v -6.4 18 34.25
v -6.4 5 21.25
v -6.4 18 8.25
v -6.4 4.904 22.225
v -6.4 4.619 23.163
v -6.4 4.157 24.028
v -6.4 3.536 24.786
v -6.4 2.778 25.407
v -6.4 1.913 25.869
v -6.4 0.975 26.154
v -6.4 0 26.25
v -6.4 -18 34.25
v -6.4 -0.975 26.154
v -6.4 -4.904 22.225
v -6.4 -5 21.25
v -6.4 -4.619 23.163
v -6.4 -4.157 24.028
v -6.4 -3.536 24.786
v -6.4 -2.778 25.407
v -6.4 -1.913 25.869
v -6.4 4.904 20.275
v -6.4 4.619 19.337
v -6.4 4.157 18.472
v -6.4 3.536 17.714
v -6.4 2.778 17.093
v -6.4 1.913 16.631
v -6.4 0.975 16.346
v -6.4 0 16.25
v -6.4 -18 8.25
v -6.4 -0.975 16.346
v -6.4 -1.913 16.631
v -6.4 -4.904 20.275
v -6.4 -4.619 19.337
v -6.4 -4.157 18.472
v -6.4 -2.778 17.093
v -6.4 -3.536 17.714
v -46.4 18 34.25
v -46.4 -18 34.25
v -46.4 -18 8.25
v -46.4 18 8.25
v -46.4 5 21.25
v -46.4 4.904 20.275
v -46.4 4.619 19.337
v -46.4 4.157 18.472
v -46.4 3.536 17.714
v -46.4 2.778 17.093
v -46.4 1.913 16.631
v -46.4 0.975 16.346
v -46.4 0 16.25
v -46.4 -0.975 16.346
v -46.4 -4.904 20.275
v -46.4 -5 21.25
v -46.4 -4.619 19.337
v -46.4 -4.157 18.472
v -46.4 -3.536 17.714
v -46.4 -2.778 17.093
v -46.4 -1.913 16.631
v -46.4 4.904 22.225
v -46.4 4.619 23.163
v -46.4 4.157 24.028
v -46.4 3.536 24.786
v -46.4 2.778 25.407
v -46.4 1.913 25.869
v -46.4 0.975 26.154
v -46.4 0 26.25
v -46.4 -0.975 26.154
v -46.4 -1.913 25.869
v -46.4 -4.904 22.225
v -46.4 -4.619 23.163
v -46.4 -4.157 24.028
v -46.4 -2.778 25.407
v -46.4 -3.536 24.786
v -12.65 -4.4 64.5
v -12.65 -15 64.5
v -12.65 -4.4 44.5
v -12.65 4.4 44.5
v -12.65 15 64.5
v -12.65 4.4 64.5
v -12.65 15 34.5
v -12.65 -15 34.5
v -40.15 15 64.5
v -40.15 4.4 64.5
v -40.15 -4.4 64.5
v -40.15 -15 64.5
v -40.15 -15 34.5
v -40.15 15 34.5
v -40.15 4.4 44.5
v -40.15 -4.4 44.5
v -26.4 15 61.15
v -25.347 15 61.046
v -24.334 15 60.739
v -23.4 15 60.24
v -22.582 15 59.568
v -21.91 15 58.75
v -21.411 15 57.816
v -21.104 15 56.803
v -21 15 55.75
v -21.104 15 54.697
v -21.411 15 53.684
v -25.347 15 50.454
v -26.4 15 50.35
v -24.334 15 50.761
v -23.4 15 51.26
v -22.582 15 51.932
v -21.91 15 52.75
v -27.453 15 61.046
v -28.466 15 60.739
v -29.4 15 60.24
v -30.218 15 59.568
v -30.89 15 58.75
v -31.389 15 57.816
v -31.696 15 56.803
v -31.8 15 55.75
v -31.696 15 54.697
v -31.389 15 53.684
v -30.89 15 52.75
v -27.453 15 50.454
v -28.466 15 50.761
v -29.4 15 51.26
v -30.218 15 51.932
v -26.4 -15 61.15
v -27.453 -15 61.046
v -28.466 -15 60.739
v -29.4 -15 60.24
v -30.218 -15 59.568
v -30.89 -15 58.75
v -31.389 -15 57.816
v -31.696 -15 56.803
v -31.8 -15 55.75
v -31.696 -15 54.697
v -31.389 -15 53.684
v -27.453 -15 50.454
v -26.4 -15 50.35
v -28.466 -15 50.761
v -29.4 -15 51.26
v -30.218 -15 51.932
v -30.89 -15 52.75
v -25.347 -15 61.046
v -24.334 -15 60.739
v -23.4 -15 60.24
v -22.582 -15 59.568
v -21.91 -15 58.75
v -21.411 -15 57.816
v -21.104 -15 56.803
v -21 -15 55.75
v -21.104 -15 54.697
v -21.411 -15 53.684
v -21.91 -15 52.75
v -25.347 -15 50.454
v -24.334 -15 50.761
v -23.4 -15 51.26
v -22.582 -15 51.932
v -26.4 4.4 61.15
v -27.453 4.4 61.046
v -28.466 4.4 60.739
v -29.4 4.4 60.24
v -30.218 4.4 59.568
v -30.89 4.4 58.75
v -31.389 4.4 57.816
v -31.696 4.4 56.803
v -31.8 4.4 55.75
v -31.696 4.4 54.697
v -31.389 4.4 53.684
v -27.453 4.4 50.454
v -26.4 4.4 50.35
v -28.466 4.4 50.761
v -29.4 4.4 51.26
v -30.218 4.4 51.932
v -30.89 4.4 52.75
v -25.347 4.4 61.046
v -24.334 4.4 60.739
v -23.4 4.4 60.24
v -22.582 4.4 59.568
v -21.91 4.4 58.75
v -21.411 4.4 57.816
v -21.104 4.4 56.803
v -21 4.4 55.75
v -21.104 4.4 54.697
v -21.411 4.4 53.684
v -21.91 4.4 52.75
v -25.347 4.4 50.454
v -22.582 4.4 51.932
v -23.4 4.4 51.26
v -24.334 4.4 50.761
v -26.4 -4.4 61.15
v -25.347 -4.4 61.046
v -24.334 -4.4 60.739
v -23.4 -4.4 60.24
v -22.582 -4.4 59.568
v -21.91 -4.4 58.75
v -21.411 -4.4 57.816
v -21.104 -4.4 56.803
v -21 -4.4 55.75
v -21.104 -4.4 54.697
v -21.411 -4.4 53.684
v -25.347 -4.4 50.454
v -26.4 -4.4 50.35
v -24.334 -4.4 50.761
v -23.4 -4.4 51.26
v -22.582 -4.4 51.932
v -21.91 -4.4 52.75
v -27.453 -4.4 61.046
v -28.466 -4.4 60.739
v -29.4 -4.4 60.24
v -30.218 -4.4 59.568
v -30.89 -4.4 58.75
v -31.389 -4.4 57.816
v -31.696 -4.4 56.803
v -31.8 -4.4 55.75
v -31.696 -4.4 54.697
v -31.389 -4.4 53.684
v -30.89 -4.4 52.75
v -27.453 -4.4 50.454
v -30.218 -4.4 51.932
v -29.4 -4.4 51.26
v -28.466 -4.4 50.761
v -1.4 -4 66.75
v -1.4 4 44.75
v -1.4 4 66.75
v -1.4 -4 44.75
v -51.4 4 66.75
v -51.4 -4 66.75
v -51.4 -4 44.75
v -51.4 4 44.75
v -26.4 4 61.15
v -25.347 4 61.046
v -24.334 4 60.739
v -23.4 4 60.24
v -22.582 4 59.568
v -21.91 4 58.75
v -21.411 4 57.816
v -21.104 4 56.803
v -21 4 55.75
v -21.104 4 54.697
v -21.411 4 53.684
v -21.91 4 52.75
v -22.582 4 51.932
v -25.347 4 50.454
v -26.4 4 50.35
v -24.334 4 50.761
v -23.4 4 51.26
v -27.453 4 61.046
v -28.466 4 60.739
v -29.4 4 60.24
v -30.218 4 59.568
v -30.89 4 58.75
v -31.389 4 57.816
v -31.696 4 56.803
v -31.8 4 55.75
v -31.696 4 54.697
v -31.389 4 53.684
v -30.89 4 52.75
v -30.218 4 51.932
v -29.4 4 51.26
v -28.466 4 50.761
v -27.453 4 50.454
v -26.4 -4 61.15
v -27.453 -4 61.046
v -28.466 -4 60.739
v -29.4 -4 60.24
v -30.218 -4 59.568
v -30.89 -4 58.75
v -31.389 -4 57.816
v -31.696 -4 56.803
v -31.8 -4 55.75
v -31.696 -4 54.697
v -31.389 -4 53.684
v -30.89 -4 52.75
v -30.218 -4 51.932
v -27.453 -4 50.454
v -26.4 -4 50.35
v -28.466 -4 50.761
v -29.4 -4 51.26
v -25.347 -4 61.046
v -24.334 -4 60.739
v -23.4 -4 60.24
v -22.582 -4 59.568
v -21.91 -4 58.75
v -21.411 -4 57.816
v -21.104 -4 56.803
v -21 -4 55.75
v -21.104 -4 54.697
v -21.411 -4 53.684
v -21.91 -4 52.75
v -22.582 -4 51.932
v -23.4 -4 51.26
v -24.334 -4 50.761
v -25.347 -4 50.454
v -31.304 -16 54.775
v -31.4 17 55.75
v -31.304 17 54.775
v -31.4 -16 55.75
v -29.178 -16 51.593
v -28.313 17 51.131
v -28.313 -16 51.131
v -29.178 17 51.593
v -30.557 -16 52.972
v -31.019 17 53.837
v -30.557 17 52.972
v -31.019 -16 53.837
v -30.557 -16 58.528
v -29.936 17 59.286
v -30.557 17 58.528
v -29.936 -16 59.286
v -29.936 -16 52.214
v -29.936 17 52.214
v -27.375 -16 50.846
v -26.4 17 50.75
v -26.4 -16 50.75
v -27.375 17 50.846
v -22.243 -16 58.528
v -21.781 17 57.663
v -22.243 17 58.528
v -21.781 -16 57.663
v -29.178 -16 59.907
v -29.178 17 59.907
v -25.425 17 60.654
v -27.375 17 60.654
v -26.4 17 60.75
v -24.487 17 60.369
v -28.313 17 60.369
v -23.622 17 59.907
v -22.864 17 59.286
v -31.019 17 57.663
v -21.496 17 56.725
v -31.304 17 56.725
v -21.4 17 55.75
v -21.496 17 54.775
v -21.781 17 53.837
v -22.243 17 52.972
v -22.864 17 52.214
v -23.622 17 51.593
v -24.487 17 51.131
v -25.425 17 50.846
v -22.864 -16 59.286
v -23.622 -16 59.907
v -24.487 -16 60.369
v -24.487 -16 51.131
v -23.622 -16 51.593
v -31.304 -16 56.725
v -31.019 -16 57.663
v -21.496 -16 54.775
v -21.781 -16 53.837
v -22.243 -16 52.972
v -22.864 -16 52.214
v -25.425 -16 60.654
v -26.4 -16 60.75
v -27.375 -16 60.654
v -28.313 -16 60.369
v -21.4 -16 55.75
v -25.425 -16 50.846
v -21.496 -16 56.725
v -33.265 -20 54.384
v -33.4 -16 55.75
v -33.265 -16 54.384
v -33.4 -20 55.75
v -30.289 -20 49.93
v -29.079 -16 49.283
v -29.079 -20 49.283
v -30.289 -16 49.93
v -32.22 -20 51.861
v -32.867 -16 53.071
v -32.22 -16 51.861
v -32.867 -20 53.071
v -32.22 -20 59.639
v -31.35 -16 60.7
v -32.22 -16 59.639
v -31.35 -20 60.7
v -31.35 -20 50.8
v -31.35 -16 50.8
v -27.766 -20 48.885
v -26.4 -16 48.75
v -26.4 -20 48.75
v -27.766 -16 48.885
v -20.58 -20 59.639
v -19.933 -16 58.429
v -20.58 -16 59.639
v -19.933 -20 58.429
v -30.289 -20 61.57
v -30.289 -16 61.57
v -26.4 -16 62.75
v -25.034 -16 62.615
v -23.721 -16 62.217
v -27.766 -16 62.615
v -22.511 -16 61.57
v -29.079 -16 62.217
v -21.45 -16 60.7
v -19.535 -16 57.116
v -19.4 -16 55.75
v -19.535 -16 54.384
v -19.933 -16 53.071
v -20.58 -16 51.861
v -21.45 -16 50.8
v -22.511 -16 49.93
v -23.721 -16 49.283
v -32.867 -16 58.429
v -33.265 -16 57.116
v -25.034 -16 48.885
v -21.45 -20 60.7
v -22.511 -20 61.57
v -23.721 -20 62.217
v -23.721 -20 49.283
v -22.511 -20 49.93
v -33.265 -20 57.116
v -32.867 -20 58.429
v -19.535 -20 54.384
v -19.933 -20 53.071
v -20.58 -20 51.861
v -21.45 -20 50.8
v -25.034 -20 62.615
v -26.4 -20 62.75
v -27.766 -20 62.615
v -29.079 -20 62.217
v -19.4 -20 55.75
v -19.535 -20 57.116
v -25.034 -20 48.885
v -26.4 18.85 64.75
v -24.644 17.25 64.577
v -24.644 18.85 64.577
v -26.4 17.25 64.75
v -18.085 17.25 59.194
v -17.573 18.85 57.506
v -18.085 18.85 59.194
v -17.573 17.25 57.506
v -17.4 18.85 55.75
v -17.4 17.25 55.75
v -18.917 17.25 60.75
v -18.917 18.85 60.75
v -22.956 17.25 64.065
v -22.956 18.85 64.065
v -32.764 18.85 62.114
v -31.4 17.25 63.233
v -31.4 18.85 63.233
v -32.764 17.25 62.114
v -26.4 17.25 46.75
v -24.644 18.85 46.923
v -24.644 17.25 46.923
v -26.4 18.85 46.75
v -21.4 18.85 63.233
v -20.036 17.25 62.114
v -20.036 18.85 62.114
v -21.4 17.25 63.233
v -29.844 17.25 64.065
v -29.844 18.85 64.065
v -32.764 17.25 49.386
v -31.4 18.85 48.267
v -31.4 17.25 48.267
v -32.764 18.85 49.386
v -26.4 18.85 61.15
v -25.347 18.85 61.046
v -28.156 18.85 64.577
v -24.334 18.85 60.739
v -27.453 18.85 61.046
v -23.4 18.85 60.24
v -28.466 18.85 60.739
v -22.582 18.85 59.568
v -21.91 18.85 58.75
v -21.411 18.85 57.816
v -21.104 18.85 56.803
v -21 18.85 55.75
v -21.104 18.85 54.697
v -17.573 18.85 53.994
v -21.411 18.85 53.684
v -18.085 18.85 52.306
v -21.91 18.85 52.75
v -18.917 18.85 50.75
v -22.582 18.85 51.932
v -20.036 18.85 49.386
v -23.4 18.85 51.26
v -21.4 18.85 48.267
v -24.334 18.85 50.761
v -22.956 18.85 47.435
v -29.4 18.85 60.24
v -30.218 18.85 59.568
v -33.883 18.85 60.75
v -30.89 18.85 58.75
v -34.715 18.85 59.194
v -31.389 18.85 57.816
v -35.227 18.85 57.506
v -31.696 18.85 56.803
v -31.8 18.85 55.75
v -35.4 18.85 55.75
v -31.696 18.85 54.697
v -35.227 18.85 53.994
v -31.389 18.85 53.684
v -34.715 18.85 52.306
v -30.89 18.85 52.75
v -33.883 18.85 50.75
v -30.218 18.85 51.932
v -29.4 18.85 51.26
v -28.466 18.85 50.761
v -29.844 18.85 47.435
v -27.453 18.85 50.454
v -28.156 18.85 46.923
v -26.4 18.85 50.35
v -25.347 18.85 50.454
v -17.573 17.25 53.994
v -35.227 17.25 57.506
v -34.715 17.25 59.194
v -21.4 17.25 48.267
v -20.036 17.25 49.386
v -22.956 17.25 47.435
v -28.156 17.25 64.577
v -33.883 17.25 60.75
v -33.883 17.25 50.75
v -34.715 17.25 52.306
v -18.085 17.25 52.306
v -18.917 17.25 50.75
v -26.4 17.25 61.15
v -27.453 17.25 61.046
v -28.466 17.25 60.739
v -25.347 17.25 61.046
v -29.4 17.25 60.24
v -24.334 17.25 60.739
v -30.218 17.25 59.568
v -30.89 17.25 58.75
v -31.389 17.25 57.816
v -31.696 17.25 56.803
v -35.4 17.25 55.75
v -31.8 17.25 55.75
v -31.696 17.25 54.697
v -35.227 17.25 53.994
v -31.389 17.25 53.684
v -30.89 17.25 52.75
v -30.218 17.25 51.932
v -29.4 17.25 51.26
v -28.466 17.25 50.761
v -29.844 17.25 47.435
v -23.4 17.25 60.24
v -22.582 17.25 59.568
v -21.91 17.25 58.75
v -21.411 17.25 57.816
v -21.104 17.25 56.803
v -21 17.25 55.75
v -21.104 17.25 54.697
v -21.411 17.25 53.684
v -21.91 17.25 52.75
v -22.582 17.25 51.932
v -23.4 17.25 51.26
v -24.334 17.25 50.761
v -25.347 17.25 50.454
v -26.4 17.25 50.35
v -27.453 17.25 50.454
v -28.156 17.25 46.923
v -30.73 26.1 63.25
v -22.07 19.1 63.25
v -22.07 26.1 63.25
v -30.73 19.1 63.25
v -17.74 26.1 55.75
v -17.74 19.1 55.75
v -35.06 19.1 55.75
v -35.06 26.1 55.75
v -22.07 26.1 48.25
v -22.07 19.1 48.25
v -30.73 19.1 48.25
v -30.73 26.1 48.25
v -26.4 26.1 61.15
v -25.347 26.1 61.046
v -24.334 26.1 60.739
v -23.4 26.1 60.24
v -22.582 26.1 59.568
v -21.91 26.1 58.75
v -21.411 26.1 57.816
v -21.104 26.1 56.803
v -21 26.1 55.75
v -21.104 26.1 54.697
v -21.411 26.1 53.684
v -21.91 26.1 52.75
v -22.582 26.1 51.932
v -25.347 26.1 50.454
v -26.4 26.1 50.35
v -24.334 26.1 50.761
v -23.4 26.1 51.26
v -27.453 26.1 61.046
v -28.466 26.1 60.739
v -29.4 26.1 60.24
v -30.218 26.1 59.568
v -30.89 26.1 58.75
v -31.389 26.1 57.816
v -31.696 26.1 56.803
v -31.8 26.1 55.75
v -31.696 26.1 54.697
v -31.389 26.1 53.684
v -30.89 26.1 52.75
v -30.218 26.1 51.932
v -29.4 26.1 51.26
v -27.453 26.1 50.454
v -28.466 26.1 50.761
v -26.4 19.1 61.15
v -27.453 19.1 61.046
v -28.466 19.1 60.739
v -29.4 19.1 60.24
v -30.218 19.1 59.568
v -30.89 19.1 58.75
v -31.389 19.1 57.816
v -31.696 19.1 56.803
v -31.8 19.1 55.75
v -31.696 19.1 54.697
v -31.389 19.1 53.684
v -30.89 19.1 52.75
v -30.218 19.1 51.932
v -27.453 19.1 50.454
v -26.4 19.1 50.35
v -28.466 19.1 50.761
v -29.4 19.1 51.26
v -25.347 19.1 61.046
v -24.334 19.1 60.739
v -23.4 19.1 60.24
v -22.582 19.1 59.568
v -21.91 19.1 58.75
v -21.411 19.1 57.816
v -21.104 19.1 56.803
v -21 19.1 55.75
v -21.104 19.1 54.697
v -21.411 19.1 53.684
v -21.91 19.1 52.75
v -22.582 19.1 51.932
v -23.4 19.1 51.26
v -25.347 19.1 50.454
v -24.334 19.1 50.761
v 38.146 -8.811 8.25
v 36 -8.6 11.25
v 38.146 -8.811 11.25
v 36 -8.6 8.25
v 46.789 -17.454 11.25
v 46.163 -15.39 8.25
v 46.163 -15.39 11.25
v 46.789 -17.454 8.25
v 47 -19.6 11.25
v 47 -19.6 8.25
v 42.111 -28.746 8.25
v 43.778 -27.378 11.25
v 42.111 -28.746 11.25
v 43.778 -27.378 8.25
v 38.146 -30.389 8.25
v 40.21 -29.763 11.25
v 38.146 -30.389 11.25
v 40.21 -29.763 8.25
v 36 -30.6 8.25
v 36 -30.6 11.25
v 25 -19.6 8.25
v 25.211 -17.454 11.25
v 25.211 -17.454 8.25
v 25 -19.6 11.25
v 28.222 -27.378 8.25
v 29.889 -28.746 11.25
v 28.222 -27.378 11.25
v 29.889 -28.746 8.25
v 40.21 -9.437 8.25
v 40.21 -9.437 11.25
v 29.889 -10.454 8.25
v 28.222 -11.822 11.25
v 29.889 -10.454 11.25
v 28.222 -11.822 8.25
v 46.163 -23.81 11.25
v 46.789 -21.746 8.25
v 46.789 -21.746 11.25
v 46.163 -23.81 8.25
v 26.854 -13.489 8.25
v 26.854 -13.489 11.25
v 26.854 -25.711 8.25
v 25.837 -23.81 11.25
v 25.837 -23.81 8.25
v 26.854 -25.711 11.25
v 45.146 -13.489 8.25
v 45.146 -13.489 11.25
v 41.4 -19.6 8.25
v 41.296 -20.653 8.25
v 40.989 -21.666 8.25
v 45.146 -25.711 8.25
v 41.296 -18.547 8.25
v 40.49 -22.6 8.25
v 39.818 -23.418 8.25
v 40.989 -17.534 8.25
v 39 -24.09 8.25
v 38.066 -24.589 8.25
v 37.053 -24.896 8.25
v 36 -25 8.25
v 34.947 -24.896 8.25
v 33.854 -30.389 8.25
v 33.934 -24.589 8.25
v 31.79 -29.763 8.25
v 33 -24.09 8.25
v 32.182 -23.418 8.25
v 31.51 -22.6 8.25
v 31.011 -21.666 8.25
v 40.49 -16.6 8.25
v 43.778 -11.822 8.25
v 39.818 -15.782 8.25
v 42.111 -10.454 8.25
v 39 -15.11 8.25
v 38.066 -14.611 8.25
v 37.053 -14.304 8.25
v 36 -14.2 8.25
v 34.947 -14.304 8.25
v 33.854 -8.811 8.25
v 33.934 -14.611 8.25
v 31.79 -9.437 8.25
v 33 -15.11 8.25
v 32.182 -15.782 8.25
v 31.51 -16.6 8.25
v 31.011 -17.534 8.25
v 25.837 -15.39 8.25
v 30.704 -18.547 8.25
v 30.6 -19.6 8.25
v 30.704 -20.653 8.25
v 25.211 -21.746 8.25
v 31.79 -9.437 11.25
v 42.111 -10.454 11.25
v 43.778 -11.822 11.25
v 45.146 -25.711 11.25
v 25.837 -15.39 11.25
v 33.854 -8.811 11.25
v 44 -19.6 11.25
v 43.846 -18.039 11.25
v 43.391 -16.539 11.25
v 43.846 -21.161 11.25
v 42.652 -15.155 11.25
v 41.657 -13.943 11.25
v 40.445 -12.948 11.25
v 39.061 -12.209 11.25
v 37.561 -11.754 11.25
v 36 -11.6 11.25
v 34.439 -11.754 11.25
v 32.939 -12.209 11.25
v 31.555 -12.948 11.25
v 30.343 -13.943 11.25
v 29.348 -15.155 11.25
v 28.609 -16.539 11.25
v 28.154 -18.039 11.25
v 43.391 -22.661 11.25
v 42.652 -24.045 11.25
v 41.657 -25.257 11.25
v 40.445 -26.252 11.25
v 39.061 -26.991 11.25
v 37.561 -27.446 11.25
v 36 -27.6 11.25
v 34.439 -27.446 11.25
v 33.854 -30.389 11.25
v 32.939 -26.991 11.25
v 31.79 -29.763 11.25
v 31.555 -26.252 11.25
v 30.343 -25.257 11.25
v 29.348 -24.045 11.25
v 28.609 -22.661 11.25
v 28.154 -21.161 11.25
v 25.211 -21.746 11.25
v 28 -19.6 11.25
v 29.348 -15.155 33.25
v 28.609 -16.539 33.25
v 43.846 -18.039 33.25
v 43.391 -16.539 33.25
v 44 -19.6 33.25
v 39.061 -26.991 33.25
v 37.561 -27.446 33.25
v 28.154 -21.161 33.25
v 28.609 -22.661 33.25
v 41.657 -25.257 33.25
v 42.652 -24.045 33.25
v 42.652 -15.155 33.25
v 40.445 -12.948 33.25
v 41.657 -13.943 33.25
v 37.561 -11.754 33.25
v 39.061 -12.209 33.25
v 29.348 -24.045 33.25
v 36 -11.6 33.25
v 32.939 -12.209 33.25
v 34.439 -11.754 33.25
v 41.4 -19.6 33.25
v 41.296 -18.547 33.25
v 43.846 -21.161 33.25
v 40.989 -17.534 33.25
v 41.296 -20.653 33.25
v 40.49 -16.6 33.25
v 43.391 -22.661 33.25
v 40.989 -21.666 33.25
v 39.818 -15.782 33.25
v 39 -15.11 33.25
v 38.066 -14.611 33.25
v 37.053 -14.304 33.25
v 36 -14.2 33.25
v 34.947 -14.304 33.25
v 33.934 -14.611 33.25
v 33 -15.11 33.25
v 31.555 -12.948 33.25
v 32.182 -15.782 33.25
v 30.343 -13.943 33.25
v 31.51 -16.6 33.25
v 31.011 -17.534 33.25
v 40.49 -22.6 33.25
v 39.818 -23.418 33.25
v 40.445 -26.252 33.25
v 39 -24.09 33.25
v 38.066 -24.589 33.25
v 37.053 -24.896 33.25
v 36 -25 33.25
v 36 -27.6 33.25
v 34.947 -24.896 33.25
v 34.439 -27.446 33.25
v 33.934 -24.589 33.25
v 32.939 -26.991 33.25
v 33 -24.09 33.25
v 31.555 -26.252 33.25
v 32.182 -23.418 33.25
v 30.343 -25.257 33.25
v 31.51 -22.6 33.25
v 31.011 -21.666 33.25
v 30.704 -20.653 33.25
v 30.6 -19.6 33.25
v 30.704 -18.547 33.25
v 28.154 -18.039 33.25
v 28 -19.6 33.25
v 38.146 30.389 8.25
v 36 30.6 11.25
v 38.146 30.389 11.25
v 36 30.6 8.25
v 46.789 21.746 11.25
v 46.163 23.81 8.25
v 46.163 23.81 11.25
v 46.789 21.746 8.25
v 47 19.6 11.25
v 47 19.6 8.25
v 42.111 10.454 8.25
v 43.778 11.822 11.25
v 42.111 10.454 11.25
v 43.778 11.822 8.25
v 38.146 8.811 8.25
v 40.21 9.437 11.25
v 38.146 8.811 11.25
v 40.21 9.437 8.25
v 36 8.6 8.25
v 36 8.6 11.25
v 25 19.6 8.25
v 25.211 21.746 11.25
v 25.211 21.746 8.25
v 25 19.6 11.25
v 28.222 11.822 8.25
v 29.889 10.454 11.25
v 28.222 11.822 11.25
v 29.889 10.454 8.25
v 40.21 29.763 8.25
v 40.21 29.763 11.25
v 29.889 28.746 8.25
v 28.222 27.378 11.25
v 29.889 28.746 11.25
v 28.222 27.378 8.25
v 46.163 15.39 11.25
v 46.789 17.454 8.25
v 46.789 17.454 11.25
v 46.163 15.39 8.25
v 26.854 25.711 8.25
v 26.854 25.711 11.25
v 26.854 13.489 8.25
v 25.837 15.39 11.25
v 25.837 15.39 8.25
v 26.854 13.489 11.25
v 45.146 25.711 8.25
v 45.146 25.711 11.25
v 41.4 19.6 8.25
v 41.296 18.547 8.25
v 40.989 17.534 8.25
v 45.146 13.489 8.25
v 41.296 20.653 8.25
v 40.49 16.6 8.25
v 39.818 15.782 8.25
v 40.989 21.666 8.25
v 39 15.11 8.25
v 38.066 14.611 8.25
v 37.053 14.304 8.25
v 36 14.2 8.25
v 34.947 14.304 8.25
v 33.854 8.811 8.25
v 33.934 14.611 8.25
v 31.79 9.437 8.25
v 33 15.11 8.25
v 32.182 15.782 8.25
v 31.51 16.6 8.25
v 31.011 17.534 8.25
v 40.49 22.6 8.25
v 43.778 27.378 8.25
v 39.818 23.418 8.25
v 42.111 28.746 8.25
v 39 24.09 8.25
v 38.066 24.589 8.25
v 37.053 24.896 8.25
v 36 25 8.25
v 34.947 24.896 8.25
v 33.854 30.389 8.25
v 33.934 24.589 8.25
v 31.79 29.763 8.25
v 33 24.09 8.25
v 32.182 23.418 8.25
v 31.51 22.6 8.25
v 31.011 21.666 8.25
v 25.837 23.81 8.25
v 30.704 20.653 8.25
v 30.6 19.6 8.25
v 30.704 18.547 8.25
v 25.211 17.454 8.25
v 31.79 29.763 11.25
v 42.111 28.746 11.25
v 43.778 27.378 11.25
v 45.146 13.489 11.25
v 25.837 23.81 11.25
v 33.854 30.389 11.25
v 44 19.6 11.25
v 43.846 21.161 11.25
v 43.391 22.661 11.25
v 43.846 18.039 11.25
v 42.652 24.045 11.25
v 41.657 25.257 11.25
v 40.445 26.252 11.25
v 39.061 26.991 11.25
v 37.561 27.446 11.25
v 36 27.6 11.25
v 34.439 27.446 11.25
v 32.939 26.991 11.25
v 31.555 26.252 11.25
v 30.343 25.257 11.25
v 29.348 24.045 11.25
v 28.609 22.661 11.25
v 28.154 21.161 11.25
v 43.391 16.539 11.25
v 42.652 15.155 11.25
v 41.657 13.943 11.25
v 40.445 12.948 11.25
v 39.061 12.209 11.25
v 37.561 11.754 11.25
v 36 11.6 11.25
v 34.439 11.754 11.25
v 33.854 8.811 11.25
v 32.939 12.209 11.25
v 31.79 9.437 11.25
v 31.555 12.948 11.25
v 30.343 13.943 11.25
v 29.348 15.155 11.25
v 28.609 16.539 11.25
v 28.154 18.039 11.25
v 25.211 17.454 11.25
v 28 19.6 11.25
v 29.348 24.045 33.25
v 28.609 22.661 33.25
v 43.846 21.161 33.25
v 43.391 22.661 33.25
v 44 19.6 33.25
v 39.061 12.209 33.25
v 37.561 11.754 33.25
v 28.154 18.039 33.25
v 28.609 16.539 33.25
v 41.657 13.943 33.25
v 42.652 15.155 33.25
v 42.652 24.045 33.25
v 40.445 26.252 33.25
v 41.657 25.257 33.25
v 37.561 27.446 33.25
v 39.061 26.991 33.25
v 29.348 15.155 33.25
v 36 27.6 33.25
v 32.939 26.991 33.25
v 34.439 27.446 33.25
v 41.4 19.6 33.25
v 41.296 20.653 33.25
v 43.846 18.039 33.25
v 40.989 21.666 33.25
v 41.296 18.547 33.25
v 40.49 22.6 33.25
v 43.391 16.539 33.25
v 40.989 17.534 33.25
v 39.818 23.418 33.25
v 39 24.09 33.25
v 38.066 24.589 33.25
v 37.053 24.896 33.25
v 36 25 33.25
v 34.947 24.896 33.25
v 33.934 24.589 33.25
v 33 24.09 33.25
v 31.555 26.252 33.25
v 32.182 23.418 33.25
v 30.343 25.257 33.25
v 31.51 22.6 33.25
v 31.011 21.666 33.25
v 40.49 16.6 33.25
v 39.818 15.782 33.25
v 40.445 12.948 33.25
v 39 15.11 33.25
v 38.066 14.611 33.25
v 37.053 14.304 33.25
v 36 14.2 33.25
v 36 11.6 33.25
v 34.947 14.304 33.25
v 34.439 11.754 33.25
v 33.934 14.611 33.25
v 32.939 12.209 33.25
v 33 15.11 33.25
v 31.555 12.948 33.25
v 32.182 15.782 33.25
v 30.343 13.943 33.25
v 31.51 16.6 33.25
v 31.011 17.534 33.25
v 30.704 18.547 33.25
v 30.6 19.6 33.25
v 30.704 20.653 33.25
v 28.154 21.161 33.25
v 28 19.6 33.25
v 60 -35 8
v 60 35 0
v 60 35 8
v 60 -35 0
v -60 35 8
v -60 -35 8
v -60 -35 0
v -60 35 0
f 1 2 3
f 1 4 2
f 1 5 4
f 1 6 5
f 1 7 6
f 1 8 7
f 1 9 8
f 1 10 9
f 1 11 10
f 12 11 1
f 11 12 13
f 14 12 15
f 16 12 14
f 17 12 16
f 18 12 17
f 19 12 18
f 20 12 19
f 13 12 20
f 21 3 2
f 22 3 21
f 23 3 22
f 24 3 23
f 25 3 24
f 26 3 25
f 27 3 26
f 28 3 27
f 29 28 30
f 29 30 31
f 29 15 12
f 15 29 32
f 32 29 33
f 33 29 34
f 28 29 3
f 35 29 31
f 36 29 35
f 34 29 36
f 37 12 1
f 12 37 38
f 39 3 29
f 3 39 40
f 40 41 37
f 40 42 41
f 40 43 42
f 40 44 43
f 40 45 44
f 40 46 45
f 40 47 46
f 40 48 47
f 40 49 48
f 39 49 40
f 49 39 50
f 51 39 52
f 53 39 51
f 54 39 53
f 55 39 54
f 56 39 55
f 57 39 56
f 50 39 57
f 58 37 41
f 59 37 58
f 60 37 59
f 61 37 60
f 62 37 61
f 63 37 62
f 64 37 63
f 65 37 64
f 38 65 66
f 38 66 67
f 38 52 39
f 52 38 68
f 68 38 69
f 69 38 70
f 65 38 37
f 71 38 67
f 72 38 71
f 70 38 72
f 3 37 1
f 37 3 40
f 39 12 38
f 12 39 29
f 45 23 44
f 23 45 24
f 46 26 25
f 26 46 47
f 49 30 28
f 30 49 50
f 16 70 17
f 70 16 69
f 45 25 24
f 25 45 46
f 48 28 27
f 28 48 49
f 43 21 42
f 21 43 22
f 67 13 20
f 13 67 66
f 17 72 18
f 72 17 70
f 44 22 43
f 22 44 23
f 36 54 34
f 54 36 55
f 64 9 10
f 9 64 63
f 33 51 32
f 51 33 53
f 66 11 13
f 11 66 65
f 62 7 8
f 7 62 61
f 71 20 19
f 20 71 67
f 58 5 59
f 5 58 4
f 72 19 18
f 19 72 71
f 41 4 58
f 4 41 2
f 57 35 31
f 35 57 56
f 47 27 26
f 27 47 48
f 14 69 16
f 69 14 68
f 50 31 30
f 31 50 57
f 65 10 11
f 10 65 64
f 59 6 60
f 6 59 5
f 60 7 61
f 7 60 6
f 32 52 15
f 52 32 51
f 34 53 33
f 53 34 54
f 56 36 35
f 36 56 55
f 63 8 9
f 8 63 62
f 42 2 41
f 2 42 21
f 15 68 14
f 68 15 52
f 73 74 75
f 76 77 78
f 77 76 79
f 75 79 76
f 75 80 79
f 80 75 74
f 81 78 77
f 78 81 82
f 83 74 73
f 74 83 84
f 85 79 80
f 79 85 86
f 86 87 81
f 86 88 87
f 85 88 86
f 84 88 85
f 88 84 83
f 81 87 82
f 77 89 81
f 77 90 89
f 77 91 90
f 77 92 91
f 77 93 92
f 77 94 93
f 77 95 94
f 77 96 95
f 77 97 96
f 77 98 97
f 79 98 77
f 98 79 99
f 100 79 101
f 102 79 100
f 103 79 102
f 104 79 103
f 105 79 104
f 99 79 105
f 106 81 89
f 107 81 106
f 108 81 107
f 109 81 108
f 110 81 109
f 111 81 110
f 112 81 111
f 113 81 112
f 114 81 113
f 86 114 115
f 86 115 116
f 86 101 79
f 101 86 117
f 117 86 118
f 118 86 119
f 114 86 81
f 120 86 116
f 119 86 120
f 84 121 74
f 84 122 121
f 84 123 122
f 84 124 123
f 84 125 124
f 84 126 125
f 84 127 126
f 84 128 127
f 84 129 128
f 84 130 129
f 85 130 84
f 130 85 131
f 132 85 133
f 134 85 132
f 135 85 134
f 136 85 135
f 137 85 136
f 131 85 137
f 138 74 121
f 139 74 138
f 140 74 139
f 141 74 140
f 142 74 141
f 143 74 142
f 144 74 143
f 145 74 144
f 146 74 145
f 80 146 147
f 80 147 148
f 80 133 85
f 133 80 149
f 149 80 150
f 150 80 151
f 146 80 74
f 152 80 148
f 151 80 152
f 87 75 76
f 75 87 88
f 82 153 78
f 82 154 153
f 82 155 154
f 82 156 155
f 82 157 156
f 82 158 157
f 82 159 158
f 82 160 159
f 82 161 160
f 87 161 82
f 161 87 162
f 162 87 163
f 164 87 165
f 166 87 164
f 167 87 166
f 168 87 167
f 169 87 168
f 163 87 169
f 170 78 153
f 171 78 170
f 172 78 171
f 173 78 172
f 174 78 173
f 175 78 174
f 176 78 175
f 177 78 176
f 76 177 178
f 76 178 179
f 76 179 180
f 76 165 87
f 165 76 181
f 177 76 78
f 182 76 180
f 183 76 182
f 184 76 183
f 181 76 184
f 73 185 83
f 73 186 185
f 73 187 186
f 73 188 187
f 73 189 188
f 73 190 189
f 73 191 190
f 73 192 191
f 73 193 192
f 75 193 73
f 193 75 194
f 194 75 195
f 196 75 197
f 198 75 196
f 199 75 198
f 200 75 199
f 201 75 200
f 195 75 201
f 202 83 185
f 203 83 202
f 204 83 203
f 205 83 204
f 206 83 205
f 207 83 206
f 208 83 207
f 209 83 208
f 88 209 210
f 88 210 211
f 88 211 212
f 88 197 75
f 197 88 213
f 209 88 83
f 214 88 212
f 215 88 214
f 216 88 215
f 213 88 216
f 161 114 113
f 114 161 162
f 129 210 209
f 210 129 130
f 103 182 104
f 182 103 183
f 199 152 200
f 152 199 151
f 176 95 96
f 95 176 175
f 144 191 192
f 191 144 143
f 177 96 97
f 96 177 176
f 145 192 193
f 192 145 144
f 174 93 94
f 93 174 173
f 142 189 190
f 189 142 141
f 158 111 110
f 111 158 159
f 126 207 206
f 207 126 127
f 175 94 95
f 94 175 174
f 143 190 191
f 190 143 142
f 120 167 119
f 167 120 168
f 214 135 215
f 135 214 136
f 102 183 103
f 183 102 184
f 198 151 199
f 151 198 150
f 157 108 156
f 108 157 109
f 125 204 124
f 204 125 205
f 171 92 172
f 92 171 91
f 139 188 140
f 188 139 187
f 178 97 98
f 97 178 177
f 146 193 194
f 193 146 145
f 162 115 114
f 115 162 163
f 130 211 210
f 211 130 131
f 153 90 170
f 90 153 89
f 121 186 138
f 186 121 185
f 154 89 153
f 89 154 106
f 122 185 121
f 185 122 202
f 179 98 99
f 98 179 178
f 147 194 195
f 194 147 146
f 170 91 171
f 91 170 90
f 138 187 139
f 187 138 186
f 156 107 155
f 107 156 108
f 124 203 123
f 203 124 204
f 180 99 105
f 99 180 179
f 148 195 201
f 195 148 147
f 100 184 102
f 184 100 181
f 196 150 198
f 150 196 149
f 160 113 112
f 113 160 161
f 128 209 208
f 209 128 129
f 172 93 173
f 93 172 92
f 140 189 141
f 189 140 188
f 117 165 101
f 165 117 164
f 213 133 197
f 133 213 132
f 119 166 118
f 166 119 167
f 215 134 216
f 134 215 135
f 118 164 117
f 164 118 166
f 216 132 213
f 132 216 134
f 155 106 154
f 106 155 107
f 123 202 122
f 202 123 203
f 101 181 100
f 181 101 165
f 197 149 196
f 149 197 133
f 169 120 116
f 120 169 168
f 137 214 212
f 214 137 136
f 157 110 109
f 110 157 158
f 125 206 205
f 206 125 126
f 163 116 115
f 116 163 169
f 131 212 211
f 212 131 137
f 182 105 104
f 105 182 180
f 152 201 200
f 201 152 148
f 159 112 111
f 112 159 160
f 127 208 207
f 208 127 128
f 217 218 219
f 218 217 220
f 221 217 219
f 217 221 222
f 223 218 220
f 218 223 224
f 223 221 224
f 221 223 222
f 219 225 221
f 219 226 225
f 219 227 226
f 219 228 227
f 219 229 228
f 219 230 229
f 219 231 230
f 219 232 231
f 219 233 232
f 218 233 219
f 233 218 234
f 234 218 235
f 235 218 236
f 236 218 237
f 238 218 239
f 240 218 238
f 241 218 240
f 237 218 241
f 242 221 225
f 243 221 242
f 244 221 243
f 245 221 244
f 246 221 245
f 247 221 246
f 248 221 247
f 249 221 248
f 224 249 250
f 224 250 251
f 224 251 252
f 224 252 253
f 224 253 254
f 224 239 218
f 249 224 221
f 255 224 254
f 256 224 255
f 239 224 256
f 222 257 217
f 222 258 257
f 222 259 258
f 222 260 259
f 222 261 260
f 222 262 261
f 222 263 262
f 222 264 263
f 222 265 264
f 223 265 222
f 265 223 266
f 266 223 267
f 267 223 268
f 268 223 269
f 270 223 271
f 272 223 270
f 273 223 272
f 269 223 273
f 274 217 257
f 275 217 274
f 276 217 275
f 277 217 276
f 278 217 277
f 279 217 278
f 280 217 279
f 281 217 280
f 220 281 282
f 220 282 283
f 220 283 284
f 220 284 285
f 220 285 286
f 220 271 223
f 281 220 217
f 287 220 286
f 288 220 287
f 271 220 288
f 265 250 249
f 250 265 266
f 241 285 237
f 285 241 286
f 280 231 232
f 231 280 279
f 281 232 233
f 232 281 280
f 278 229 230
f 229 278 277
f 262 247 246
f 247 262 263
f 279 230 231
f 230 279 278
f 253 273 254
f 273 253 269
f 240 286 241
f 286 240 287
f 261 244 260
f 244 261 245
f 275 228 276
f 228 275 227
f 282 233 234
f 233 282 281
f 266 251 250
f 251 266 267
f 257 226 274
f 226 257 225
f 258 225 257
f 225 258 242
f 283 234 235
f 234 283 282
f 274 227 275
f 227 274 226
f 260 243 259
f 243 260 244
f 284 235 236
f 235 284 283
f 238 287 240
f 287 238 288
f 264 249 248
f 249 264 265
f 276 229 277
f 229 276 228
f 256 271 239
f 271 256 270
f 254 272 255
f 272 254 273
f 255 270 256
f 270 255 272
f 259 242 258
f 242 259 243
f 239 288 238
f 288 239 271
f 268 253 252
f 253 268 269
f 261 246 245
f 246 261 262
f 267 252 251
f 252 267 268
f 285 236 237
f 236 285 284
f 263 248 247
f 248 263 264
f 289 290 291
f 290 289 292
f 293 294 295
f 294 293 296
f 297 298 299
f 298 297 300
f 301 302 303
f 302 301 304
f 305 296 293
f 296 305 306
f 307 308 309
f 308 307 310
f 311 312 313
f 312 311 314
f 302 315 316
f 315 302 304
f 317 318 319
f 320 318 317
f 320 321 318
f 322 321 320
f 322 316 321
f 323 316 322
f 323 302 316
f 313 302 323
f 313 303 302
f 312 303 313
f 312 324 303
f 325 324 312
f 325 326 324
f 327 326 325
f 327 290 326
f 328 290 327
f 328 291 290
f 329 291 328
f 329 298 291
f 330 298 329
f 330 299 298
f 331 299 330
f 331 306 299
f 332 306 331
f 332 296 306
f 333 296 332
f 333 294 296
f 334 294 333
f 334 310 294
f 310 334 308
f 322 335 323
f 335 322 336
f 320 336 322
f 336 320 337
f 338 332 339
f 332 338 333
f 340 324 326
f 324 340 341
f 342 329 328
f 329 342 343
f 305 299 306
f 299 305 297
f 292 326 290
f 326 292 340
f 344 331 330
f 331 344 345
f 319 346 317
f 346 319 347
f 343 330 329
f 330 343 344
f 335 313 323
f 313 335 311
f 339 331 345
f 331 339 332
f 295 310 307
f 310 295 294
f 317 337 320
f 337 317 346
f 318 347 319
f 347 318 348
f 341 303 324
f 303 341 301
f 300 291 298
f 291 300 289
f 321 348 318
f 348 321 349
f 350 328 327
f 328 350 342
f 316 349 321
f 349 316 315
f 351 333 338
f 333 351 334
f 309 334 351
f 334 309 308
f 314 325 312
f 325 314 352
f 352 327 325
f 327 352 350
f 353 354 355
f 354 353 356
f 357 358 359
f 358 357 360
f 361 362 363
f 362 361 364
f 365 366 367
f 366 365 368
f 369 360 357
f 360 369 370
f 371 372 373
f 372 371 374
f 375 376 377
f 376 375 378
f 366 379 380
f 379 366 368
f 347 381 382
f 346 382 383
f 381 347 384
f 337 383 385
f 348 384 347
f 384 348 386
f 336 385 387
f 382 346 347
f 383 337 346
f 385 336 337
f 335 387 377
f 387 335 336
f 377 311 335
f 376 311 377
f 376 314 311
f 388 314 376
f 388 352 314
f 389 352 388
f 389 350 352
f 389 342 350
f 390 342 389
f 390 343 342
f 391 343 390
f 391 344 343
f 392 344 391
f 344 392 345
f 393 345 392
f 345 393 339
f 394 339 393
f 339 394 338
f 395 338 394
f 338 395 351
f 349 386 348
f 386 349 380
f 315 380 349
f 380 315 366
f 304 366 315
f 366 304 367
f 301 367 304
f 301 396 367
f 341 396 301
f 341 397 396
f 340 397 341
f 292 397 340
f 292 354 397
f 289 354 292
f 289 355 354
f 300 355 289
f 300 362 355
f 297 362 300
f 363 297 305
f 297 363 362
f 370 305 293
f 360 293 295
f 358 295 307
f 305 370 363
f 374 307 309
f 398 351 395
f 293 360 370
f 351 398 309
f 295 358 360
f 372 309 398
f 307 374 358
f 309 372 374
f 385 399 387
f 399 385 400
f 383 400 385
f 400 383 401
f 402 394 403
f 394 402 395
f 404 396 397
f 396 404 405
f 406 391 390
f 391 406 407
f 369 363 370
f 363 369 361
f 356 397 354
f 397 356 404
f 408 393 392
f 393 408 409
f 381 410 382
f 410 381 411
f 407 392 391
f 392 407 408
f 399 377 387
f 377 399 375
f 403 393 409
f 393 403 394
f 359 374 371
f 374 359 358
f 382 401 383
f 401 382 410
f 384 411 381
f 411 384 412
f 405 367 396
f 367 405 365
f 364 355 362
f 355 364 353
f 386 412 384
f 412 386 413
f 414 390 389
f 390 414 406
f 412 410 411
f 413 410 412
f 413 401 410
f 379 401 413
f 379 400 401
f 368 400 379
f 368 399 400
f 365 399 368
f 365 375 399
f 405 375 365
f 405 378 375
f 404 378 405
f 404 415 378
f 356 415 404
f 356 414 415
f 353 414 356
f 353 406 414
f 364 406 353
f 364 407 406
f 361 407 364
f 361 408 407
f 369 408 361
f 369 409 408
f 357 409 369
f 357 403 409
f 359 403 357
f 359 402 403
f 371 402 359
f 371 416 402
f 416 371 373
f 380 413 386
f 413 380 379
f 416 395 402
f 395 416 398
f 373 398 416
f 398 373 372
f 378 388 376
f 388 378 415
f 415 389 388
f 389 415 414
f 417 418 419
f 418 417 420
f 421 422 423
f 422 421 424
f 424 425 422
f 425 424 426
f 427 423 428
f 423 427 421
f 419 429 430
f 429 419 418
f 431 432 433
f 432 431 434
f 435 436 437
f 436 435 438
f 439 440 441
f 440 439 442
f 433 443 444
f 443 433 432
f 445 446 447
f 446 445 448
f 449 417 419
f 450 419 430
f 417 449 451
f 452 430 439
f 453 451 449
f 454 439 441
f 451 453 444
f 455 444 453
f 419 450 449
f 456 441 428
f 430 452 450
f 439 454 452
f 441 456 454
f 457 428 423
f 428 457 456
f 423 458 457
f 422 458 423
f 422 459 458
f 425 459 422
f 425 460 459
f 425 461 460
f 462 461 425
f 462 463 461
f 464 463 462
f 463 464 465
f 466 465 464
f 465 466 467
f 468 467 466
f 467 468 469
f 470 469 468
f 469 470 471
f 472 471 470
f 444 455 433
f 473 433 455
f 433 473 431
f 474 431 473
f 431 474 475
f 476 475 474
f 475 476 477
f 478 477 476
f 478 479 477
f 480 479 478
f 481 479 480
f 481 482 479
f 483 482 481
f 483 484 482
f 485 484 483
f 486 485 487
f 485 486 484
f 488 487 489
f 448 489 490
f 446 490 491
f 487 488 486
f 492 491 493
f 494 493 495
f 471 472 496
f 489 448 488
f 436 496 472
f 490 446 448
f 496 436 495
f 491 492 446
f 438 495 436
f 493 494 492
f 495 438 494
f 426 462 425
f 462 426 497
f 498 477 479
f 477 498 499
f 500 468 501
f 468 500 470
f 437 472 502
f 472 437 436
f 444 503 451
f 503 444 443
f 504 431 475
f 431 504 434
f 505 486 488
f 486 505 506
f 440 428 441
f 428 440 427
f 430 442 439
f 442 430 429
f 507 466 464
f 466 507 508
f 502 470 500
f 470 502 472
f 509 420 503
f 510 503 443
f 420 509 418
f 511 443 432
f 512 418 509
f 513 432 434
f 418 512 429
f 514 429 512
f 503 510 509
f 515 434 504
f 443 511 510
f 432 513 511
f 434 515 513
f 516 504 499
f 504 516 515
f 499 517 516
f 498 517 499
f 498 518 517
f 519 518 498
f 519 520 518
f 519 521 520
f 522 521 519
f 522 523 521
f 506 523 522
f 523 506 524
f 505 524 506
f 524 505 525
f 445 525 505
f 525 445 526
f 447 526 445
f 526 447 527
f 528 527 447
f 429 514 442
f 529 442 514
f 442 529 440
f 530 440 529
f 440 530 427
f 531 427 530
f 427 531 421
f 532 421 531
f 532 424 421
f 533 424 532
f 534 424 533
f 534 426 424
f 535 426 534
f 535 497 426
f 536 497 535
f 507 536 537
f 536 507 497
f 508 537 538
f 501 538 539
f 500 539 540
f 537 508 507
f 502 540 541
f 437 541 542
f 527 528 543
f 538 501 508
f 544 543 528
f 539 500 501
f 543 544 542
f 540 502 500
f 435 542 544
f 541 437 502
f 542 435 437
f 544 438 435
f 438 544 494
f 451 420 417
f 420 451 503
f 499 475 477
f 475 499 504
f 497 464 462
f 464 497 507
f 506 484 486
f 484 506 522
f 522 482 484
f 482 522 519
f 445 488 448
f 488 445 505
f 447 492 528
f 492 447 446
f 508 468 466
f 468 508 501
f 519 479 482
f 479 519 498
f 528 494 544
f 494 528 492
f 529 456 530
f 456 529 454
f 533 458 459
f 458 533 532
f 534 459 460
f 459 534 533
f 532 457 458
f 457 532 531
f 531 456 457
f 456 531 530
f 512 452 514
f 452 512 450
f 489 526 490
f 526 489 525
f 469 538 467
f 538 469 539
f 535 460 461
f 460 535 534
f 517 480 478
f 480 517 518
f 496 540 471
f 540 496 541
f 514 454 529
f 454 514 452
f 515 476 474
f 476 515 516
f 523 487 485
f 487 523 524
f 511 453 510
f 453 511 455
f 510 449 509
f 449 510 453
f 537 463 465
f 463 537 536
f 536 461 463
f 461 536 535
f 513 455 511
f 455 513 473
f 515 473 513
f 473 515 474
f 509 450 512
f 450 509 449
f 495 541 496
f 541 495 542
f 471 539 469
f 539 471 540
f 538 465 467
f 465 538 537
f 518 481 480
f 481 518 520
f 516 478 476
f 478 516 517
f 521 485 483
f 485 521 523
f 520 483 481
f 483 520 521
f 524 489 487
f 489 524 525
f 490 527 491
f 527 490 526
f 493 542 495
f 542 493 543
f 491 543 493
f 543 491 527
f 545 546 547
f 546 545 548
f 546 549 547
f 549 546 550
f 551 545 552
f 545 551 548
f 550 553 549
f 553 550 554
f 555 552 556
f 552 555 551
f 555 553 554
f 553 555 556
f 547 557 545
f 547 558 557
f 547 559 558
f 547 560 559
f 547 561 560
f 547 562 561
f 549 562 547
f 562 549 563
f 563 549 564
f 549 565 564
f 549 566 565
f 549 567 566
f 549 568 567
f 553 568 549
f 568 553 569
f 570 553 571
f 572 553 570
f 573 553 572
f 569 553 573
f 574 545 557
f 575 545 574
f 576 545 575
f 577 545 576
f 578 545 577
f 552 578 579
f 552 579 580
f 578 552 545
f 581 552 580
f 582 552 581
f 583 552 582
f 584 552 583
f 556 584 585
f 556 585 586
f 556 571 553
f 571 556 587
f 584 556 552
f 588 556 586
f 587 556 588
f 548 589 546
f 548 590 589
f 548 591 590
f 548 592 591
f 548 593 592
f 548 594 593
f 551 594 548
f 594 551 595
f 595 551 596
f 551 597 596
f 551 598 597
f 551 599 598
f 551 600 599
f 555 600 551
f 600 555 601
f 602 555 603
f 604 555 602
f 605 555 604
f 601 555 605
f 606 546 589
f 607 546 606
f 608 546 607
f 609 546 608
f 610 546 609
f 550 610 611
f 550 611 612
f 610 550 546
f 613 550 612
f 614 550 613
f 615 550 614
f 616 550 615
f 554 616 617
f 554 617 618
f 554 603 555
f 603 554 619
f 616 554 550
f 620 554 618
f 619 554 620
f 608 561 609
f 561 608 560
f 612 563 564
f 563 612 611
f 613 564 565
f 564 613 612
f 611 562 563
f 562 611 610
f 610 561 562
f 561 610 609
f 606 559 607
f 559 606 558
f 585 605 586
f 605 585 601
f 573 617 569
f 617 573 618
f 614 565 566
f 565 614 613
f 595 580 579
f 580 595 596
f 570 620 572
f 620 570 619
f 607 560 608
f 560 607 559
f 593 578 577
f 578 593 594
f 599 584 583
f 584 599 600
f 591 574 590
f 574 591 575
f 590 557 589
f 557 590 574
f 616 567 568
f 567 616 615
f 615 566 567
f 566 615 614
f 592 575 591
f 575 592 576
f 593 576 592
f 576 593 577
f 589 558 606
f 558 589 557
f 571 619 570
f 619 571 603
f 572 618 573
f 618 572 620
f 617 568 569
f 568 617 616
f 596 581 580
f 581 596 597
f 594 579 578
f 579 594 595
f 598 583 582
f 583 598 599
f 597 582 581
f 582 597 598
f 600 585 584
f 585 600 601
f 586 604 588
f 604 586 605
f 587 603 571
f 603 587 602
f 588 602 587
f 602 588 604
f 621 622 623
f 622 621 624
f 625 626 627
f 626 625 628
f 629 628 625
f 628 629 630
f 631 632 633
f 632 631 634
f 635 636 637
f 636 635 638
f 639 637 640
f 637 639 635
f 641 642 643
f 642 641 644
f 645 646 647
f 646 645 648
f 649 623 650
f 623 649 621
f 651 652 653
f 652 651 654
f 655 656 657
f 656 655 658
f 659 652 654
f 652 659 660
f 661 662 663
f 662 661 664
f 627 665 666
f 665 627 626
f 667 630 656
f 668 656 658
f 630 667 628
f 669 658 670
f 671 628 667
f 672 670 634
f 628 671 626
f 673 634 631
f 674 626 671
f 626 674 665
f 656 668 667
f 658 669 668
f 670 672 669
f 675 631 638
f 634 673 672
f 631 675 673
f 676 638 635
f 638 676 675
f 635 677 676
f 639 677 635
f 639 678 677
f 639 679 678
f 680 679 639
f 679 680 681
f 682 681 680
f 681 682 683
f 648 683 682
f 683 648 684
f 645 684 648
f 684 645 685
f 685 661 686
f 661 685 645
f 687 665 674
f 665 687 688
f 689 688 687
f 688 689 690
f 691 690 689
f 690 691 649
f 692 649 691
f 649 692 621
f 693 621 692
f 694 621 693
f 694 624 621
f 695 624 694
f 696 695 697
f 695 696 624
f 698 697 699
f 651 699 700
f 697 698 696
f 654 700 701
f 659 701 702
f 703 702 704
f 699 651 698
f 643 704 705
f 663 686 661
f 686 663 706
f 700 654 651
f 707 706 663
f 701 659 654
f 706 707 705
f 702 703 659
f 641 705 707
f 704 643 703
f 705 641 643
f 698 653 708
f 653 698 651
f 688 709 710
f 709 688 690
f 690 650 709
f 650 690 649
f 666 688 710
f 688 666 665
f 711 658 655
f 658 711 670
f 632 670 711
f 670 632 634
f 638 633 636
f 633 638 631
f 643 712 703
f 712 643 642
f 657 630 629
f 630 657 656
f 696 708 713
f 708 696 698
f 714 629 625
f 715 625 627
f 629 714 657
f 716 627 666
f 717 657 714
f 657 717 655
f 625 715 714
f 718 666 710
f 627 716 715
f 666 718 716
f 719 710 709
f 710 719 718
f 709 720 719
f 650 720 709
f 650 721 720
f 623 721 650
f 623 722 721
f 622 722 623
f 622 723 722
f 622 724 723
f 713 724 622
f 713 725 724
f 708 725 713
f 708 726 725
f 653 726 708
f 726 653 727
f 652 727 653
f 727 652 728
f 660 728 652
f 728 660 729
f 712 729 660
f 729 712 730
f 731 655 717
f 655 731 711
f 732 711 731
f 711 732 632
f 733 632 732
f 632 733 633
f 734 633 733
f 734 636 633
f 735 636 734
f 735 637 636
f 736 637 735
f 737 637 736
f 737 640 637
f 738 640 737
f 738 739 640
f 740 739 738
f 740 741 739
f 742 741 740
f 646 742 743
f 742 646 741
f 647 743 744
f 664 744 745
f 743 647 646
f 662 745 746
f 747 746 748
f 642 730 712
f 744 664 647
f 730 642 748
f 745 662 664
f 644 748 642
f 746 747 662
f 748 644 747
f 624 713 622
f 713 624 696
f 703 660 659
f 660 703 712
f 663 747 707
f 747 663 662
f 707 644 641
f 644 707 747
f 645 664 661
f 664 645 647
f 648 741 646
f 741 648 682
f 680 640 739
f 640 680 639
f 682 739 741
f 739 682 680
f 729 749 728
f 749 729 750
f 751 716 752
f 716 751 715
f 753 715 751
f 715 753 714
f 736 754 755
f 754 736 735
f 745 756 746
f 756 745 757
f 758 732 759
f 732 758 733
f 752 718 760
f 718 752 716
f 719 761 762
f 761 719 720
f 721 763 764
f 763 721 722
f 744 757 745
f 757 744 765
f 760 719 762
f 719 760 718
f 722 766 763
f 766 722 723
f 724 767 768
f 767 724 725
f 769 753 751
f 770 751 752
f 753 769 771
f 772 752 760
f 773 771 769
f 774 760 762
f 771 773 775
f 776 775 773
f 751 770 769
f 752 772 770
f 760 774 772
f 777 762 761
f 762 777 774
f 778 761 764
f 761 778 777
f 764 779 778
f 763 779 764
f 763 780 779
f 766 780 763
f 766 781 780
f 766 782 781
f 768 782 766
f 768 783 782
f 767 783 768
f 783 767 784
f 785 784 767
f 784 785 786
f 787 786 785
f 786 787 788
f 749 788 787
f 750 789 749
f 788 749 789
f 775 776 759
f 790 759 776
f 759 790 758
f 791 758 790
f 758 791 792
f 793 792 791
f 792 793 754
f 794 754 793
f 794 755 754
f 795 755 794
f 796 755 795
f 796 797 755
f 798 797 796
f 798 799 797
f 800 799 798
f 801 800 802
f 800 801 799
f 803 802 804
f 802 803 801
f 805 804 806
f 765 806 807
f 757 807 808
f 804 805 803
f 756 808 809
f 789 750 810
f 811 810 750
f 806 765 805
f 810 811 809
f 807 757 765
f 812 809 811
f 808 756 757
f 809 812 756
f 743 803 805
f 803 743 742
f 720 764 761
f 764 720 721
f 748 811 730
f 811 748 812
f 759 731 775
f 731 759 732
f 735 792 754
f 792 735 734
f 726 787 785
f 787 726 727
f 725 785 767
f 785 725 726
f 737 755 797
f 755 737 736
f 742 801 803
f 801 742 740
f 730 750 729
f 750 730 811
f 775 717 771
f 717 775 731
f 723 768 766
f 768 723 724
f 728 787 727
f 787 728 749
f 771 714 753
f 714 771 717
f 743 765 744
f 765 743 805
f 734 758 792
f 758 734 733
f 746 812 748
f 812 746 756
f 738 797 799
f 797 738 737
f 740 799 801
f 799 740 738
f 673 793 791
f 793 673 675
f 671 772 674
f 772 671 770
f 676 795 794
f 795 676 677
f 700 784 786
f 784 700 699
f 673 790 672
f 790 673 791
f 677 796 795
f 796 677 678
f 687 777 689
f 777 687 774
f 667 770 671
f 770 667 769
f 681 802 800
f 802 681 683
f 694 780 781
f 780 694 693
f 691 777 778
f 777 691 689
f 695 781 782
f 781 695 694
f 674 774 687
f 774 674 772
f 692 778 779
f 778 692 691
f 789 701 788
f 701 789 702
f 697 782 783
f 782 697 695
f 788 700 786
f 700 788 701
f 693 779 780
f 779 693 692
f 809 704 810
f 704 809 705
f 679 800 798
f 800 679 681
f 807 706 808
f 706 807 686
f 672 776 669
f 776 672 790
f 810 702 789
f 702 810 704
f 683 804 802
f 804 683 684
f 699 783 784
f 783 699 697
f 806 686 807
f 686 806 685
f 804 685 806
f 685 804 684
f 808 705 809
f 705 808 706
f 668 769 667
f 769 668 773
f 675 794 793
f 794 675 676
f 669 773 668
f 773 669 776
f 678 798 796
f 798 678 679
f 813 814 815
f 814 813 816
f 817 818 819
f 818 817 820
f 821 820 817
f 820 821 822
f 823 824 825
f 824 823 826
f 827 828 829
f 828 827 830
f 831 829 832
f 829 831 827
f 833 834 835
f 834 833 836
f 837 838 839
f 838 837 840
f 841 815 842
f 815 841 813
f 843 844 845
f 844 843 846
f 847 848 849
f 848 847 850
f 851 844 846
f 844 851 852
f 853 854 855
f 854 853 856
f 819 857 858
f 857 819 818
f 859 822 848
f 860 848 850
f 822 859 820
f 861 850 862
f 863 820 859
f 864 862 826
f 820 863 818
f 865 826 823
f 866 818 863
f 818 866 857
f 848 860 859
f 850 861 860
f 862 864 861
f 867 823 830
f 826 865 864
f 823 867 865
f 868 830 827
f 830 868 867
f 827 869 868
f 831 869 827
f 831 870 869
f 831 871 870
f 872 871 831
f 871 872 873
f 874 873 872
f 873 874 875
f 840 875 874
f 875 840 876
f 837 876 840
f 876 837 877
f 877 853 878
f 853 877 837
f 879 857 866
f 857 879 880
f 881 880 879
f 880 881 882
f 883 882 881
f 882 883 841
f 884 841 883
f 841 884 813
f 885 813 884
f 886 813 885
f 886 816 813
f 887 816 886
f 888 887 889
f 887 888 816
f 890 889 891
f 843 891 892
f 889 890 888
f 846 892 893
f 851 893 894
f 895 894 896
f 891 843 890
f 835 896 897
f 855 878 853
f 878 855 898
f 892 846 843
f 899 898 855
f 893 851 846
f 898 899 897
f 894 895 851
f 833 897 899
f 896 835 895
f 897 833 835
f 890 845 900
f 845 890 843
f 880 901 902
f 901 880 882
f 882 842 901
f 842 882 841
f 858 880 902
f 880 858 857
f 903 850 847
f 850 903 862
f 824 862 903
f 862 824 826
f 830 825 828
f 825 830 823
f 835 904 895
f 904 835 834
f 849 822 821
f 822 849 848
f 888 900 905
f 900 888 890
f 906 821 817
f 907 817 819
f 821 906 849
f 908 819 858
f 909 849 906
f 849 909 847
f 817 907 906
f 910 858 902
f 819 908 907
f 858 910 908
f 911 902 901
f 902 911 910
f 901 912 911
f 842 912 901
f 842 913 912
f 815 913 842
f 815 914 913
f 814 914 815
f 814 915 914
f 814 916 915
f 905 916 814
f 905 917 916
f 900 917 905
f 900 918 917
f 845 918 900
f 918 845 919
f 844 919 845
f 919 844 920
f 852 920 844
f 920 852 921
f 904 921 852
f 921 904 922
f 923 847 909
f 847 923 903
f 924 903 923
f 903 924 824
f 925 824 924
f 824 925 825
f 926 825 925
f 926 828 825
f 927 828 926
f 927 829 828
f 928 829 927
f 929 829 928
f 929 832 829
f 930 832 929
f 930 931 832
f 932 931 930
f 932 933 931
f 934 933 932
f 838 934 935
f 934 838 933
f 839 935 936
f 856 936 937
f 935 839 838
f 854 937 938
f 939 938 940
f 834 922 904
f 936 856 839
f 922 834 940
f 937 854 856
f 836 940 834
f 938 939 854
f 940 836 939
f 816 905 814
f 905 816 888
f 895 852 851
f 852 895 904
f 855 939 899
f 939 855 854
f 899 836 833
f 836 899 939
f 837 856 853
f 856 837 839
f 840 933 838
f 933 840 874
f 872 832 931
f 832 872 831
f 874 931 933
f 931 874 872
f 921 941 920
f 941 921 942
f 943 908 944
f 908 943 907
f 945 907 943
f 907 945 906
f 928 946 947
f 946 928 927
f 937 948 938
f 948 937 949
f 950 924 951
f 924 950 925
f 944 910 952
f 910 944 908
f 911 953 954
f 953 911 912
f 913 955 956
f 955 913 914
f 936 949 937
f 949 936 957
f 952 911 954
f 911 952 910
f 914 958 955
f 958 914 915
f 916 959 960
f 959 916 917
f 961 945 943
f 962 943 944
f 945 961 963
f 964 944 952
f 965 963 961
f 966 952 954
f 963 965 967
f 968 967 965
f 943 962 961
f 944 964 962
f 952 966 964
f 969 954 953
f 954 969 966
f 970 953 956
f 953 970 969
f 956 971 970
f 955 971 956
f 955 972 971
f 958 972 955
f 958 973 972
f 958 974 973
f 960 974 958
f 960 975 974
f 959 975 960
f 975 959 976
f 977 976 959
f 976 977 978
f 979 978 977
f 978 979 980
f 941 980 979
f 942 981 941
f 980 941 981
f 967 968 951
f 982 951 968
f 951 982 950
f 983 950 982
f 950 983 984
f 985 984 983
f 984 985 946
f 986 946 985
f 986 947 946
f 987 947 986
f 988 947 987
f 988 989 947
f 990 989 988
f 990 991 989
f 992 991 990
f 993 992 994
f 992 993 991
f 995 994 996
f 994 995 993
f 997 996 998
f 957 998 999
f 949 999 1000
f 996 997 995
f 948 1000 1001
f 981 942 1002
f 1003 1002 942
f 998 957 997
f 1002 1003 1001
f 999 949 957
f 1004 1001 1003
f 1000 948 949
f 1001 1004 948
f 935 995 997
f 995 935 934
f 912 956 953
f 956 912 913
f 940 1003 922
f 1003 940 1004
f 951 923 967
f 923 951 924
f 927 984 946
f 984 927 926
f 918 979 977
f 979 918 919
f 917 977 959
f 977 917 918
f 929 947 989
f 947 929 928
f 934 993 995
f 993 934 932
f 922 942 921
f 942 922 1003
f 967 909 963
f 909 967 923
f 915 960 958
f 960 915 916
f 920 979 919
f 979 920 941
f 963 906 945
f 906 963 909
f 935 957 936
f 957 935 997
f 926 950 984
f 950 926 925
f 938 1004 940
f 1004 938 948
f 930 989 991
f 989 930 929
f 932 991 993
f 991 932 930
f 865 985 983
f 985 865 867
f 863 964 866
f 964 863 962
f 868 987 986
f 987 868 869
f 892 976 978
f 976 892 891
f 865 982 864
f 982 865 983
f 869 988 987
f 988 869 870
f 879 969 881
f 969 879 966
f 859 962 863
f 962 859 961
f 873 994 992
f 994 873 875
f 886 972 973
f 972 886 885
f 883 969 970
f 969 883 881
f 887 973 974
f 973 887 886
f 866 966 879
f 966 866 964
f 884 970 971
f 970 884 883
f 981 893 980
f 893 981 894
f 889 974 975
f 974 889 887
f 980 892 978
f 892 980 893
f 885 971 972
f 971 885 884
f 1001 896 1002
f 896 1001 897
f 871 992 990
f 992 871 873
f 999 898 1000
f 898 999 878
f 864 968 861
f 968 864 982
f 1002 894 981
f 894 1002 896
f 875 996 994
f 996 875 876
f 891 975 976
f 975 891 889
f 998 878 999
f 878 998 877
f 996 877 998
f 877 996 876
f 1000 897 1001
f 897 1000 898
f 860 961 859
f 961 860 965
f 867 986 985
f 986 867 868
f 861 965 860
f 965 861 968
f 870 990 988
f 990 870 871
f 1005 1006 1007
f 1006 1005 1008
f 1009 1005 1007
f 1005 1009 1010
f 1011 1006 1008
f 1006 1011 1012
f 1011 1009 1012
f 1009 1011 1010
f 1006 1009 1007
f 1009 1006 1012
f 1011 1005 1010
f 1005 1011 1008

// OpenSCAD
$fn = 32;

// ------------------------------------------------------------------------
// Indexing jig: plate 120 x 70 mm, pin d10
// Every part is its own module, assembly() places every instance.
// ------------------------------------------------------------------------

// --- part 1 ---
module jig_plate() {
  difference() {
    translate([-60, -35, 0]) cube([120, 70, 8]);
  }
}

// --- part 2 ---
module locator_block() {
  difference() {
    translate([-20, -18, 0]) cube([40, 36, 26]);
    translate([0, 0, 13]) rotate([0, 90, 0]) cylinder(h = 42, d = 10, center = true);
  }
}

// --- part 3 ---
module index_fork() {
  difference() {
    translate([-13.75, -15, 0]) cube([27.5, 30, 30]);
    translate([-14.75, -4.4, 10]) cube([29.5, 8.8, 21]);
    translate([0, 0, 21.25]) rotate([90, 0, 0]) cylinder(h = 32, d = 10.8, center = true);
  }
}

// --- part 4 ---
module index_arm() {
  difference() {
    translate([-25, -4, 0]) cube([50, 8, 22]);
    translate([0, 0, 11]) rotate([90, 0, 0]) cylinder(h = 10, d = 10.8, center = true);
  }
}

// --- part 5 ---
module index_pin() {
  rotate([0, 90, 0]) cylinder(h = 34, d = 10, center = true);
  translate([-20, 0, 0]) rotate([0, 90, 0]) cylinder(h = 4, d = 14);
}

// --- part 6 ---
module pin_washer() {
  difference() {
      translate([0, 0, 0]) cylinder(h = 1.6, d = 18);
      translate([0, 0, -1]) cylinder(h = 3.6, d = 10.8);
    }
}

// --- part 7 ---
module lock_nut() {
  difference() {
    linear_extrude(height = 7) polygon(points = [[8.66, 0], [4.33, 7.5], [-4.33, 7.5], [-8.66, 0], [-4.33, -7.5], [4.33, -7.5]]);
    translate([0, 0, -1]) cylinder(h = 9, d = 10.8);
  }
}

// --- part 8 ---
module guide_bush_a() {
  difference() {
    union() {
      cylinder(h = 3, d = 22);
      translate([0, 0, 3]) cylinder(h = 22, d = 16);
    }
    translate([0, 0, -1]) cylinder(h = 27, d = 10.8);
  }
}

// --- part 9 ---
module guide_bush_b() {
  difference() {
    union() {
      cylinder(h = 3, d = 22);
      translate([0, 0, 3]) cylinder(h = 22, d = 16);
    }
    translate([0, 0, -1]) cylinder(h = 27, d = 10.8);
  }
}

// --- assembly ---
module assembly() {
  color([0.80, 0.24, 0.20]) translate([0, 0, 0]) rotate([0, 0, 0]) jig_plate();
  color([0.20, 0.45, 0.75]) translate([-26.4, 0, 8.25]) rotate([0, 0, 0]) locator_block();
  color([0.25, 0.62, 0.32]) translate([-26.4, 0, 34.5]) rotate([0, 0, 0]) index_fork();
  color([0.92, 0.70, 0.18]) translate([-26.4, 0, 44.75]) rotate([0, 0, 0]) index_arm();
  color([0.58, 0.35, 0.70]) translate([-26.4, 0, 55.75]) rotate([0, 0, 90]) index_pin();
  color([0.16, 0.66, 0.66]) translate([-26.4, 18.85, 55.75]) rotate([90, 0, 0]) pin_washer();
  color([0.85, 0.48, 0.18]) translate([-26.4, 26.1, 55.75]) rotate([90, 0, 0]) lock_nut();
  color([0.55, 0.60, 0.65]) translate([36, -19.6, 8.25]) rotate([0, 0, 0]) guide_bush_a();
  color([0.75, 0.30, 0.55]) translate([36, 19.6, 8.25]) rotate([0, 0, 0]) guide_bush_b();
}

assembly();
